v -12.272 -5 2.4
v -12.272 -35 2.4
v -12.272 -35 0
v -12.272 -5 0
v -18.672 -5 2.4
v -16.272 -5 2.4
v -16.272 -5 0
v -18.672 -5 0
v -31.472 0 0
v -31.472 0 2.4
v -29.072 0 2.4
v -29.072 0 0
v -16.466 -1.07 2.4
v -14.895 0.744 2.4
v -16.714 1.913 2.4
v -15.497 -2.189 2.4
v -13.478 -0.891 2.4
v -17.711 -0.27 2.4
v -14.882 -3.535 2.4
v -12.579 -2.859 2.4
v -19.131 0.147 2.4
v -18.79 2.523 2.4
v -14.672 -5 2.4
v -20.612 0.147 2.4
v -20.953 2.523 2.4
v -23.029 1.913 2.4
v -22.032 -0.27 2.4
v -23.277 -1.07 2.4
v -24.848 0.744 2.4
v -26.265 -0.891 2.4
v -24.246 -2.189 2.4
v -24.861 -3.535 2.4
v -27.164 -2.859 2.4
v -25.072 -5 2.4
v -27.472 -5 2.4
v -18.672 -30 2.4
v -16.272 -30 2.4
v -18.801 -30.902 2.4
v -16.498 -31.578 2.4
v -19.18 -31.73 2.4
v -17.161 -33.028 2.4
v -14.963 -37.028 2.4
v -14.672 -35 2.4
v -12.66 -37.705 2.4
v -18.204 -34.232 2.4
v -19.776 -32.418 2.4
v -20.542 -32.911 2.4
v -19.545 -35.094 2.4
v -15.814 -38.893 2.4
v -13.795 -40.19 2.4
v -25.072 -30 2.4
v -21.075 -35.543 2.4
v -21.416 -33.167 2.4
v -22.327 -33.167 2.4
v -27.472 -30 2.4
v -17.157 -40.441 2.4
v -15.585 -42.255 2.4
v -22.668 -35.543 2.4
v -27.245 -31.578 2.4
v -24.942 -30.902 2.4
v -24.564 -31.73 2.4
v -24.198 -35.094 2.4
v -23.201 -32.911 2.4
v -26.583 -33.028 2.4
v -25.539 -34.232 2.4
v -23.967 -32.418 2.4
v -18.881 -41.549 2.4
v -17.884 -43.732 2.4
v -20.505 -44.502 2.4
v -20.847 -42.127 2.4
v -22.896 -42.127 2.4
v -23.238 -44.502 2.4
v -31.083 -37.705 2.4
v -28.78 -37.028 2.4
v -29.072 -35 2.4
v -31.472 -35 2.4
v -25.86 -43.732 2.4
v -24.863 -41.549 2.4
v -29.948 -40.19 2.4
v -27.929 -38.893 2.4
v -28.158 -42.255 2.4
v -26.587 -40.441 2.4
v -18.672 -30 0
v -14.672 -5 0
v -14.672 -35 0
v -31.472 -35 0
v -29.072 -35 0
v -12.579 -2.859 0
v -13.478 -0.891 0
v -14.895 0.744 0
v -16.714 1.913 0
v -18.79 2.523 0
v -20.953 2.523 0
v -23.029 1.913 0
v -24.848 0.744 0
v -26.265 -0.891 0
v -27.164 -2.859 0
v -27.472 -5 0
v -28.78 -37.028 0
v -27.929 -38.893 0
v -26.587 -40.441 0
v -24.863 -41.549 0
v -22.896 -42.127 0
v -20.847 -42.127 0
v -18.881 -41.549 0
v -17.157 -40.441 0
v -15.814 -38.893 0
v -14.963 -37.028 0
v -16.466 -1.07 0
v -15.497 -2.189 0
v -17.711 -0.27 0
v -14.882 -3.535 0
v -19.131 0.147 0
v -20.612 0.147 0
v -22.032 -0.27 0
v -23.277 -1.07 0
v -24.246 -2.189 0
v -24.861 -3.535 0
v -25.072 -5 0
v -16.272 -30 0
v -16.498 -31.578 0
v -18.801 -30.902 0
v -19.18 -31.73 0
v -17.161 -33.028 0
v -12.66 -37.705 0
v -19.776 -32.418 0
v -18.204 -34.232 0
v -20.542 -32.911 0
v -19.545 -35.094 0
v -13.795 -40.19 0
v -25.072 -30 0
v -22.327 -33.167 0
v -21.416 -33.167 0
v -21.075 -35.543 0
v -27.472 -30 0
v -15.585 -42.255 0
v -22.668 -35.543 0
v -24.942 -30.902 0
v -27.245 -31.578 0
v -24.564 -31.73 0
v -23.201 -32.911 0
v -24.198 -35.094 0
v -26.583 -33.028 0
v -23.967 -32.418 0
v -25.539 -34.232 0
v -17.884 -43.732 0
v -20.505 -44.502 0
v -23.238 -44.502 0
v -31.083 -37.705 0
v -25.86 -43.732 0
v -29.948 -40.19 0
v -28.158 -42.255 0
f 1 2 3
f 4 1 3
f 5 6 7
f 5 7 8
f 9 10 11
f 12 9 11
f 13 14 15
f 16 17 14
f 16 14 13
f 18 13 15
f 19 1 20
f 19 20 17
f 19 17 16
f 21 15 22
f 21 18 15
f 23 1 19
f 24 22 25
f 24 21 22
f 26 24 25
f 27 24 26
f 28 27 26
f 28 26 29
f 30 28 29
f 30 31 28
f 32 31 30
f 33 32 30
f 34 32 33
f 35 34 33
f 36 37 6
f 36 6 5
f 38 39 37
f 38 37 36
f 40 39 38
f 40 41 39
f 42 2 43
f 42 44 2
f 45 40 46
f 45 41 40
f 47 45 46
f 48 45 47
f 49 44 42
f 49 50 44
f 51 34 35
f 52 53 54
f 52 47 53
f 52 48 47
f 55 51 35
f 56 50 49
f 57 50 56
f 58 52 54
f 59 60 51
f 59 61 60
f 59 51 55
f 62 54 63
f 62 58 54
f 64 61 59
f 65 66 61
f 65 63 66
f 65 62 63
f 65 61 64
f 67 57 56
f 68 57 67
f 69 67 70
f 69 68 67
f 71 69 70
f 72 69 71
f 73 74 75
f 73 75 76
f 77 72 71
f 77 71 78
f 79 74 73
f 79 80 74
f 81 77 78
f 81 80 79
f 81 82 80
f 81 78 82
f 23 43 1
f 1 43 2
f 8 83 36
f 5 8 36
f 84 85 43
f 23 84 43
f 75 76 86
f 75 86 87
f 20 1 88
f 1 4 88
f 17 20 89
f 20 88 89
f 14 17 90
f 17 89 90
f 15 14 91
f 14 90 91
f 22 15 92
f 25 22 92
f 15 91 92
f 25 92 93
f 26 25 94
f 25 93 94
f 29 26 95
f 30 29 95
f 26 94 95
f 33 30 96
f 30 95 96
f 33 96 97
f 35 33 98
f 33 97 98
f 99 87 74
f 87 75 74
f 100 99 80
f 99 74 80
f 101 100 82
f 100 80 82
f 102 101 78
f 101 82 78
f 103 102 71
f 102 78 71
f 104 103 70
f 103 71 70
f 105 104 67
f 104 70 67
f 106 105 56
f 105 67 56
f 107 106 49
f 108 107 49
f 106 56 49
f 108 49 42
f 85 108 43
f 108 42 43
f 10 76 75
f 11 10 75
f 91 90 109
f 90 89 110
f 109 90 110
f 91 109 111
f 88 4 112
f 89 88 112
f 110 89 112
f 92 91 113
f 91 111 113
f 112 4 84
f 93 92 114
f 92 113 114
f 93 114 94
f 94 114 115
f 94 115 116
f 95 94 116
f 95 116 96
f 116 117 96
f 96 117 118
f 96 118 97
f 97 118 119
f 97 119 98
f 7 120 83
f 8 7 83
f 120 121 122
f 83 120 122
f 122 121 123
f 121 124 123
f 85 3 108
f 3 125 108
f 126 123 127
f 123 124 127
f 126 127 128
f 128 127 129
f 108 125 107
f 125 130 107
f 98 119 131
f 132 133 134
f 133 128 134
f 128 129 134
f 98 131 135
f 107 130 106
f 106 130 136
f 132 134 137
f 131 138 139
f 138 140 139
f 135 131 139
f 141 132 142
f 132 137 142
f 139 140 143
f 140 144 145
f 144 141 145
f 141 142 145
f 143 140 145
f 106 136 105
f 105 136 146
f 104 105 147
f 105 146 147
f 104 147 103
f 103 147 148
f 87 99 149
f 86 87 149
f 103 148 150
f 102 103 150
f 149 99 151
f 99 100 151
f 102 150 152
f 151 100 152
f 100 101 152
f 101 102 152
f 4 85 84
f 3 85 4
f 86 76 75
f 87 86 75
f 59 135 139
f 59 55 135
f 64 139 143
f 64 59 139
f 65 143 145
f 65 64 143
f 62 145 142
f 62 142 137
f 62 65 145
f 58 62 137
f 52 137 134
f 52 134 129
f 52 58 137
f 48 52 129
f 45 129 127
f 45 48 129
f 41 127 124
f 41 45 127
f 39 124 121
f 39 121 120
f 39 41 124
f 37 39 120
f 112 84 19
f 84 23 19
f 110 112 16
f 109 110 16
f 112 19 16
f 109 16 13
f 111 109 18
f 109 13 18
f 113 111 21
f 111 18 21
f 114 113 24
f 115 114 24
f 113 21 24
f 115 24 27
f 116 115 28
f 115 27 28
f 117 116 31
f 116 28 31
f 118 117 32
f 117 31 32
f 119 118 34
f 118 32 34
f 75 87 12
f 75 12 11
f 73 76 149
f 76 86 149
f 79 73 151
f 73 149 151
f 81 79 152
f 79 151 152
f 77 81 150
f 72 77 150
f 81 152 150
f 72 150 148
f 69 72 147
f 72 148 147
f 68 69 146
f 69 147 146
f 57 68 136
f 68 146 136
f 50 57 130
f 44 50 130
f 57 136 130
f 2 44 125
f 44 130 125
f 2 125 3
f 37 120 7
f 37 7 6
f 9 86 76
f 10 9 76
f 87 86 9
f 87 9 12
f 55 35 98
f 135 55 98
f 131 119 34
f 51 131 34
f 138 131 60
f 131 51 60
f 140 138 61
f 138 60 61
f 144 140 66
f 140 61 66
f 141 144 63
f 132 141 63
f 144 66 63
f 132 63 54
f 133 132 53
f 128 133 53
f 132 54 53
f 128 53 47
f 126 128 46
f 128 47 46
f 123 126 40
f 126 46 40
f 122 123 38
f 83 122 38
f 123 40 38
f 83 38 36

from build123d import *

# Parameters (mm, degrees)
F0_W      = 2.4
F0_H      = 2.4
F1_DEPTH  = 35
F2_W      = 2.4
F2_H      = 1.2
F3_ANGLE  = 180
F4_DEPTH  = 30
F5_W      = 2.4
F5_H      = 1.2
F6_ANGLE  = 180
F7_DEPTH  = 25
F8_W      = 2.4
F8_H      = 2.4
F9_ANGLE  = 180
F10_DEPTH = 25


with BuildPart() as f1:
    # F0 (on Front) → F1 (new body)
    with BuildSketch(Plane.XZ):
        with Locations((-30.2715206623, 1.2)):
            Rectangle(F0_W, F0_H)
    extrude(amount=F1_DEPTH)


with BuildPart() as f3:
    # F2 (on face) → F3 (revolve)
    with BuildSketch(Plane.XZ.offset(35)):
        with Locations((-30.2715206623, 1.8)):
            Rectangle(F2_W, F2_H)
        with Locations((-30.2715206623, 0.6)):
            Rectangle(F2_W, F2_H)
    revolve(axis=Axis((-21.8715206623, -35, 0.6), (0, 0, 1)), revolution_arc=F3_ANGLE)

    # F4 (add): a face of the model
    f4_faces = [f3.faces().sort_by_distance(p)[0] for p in [
        (-13.4715206623, -35, 1.2),
    ]]
    extrude(f4_faces, amount=F4_DEPTH)

    # F5 (on face) → F6 (revolve)
    with BuildSketch(Plane(origin=(0, -5, 0), x_dir=(-1, 0, 0), z_dir=(0, 1, 0))):
        with Locations((13.4715206623, 1.8)):
            Rectangle(F5_W, F5_H)
        with Locations((13.4715206623, 0.6)):
            Rectangle(F5_W, F5_H)
    revolve(axis=Axis((-19.8715206623, -5, 0.6), (0, 0, 1)), revolution_arc=F6_ANGLE)

    # F7 (add): a face of the model
    f7_faces = [f3.faces().sort_by_distance(p)[0] for p in [
        (-26.2715206623, -5, 1.2),
    ]]
    extrude(f7_faces, amount=F7_DEPTH)

    # F8 (on face) → F9 (revolve)
    with BuildSketch(Plane.XZ.offset(30)):
        with Locations((-26.2715206623, 1.2)):
            Rectangle(F8_W, F8_H)
    revolve(axis=Axis((-21.8715206623, -30, 1.8232566084), (0, 0, 1)), revolution_arc=F9_ANGLE)

    # F10 (add): a face of the model
    f10_faces = [f3.faces().sort_by_distance(p)[0] for p in [
        (-17.4715206623, -30, 1.2),
    ]]
    extrude(f10_faces, amount=F10_DEPTH)


solid = Compound([f1.part, f3.part])
